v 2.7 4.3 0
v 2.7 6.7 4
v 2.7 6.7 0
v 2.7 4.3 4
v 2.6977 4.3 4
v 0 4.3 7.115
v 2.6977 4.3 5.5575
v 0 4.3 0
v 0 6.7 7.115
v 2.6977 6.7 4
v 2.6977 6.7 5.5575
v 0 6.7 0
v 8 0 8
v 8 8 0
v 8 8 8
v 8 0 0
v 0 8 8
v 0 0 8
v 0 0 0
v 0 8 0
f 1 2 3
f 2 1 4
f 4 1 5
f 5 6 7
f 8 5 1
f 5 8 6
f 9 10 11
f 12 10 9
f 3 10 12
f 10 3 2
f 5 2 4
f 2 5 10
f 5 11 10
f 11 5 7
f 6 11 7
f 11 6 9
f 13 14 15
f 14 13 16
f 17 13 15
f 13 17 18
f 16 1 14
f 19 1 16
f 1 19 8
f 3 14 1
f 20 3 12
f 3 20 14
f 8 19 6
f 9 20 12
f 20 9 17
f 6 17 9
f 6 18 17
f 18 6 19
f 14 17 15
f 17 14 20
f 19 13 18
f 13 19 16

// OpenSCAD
/*
  When exporting this to STL, null polygons appear, causing
  problems normalizing normal vectors (nan output in STL files)
*/

$fs=0.2;

difference() {  
  cube(8);
 
  translate([0,20,4]) rotate([90,0,0]) union() {
    translate([0,-3,14.5]) cube([5.4,6,2.4],center=true);
    translate([0,0,13.3]) rotate([0,0,30]) cylinder(r=3.115,h=2.4,$fn=6);
  }
}
